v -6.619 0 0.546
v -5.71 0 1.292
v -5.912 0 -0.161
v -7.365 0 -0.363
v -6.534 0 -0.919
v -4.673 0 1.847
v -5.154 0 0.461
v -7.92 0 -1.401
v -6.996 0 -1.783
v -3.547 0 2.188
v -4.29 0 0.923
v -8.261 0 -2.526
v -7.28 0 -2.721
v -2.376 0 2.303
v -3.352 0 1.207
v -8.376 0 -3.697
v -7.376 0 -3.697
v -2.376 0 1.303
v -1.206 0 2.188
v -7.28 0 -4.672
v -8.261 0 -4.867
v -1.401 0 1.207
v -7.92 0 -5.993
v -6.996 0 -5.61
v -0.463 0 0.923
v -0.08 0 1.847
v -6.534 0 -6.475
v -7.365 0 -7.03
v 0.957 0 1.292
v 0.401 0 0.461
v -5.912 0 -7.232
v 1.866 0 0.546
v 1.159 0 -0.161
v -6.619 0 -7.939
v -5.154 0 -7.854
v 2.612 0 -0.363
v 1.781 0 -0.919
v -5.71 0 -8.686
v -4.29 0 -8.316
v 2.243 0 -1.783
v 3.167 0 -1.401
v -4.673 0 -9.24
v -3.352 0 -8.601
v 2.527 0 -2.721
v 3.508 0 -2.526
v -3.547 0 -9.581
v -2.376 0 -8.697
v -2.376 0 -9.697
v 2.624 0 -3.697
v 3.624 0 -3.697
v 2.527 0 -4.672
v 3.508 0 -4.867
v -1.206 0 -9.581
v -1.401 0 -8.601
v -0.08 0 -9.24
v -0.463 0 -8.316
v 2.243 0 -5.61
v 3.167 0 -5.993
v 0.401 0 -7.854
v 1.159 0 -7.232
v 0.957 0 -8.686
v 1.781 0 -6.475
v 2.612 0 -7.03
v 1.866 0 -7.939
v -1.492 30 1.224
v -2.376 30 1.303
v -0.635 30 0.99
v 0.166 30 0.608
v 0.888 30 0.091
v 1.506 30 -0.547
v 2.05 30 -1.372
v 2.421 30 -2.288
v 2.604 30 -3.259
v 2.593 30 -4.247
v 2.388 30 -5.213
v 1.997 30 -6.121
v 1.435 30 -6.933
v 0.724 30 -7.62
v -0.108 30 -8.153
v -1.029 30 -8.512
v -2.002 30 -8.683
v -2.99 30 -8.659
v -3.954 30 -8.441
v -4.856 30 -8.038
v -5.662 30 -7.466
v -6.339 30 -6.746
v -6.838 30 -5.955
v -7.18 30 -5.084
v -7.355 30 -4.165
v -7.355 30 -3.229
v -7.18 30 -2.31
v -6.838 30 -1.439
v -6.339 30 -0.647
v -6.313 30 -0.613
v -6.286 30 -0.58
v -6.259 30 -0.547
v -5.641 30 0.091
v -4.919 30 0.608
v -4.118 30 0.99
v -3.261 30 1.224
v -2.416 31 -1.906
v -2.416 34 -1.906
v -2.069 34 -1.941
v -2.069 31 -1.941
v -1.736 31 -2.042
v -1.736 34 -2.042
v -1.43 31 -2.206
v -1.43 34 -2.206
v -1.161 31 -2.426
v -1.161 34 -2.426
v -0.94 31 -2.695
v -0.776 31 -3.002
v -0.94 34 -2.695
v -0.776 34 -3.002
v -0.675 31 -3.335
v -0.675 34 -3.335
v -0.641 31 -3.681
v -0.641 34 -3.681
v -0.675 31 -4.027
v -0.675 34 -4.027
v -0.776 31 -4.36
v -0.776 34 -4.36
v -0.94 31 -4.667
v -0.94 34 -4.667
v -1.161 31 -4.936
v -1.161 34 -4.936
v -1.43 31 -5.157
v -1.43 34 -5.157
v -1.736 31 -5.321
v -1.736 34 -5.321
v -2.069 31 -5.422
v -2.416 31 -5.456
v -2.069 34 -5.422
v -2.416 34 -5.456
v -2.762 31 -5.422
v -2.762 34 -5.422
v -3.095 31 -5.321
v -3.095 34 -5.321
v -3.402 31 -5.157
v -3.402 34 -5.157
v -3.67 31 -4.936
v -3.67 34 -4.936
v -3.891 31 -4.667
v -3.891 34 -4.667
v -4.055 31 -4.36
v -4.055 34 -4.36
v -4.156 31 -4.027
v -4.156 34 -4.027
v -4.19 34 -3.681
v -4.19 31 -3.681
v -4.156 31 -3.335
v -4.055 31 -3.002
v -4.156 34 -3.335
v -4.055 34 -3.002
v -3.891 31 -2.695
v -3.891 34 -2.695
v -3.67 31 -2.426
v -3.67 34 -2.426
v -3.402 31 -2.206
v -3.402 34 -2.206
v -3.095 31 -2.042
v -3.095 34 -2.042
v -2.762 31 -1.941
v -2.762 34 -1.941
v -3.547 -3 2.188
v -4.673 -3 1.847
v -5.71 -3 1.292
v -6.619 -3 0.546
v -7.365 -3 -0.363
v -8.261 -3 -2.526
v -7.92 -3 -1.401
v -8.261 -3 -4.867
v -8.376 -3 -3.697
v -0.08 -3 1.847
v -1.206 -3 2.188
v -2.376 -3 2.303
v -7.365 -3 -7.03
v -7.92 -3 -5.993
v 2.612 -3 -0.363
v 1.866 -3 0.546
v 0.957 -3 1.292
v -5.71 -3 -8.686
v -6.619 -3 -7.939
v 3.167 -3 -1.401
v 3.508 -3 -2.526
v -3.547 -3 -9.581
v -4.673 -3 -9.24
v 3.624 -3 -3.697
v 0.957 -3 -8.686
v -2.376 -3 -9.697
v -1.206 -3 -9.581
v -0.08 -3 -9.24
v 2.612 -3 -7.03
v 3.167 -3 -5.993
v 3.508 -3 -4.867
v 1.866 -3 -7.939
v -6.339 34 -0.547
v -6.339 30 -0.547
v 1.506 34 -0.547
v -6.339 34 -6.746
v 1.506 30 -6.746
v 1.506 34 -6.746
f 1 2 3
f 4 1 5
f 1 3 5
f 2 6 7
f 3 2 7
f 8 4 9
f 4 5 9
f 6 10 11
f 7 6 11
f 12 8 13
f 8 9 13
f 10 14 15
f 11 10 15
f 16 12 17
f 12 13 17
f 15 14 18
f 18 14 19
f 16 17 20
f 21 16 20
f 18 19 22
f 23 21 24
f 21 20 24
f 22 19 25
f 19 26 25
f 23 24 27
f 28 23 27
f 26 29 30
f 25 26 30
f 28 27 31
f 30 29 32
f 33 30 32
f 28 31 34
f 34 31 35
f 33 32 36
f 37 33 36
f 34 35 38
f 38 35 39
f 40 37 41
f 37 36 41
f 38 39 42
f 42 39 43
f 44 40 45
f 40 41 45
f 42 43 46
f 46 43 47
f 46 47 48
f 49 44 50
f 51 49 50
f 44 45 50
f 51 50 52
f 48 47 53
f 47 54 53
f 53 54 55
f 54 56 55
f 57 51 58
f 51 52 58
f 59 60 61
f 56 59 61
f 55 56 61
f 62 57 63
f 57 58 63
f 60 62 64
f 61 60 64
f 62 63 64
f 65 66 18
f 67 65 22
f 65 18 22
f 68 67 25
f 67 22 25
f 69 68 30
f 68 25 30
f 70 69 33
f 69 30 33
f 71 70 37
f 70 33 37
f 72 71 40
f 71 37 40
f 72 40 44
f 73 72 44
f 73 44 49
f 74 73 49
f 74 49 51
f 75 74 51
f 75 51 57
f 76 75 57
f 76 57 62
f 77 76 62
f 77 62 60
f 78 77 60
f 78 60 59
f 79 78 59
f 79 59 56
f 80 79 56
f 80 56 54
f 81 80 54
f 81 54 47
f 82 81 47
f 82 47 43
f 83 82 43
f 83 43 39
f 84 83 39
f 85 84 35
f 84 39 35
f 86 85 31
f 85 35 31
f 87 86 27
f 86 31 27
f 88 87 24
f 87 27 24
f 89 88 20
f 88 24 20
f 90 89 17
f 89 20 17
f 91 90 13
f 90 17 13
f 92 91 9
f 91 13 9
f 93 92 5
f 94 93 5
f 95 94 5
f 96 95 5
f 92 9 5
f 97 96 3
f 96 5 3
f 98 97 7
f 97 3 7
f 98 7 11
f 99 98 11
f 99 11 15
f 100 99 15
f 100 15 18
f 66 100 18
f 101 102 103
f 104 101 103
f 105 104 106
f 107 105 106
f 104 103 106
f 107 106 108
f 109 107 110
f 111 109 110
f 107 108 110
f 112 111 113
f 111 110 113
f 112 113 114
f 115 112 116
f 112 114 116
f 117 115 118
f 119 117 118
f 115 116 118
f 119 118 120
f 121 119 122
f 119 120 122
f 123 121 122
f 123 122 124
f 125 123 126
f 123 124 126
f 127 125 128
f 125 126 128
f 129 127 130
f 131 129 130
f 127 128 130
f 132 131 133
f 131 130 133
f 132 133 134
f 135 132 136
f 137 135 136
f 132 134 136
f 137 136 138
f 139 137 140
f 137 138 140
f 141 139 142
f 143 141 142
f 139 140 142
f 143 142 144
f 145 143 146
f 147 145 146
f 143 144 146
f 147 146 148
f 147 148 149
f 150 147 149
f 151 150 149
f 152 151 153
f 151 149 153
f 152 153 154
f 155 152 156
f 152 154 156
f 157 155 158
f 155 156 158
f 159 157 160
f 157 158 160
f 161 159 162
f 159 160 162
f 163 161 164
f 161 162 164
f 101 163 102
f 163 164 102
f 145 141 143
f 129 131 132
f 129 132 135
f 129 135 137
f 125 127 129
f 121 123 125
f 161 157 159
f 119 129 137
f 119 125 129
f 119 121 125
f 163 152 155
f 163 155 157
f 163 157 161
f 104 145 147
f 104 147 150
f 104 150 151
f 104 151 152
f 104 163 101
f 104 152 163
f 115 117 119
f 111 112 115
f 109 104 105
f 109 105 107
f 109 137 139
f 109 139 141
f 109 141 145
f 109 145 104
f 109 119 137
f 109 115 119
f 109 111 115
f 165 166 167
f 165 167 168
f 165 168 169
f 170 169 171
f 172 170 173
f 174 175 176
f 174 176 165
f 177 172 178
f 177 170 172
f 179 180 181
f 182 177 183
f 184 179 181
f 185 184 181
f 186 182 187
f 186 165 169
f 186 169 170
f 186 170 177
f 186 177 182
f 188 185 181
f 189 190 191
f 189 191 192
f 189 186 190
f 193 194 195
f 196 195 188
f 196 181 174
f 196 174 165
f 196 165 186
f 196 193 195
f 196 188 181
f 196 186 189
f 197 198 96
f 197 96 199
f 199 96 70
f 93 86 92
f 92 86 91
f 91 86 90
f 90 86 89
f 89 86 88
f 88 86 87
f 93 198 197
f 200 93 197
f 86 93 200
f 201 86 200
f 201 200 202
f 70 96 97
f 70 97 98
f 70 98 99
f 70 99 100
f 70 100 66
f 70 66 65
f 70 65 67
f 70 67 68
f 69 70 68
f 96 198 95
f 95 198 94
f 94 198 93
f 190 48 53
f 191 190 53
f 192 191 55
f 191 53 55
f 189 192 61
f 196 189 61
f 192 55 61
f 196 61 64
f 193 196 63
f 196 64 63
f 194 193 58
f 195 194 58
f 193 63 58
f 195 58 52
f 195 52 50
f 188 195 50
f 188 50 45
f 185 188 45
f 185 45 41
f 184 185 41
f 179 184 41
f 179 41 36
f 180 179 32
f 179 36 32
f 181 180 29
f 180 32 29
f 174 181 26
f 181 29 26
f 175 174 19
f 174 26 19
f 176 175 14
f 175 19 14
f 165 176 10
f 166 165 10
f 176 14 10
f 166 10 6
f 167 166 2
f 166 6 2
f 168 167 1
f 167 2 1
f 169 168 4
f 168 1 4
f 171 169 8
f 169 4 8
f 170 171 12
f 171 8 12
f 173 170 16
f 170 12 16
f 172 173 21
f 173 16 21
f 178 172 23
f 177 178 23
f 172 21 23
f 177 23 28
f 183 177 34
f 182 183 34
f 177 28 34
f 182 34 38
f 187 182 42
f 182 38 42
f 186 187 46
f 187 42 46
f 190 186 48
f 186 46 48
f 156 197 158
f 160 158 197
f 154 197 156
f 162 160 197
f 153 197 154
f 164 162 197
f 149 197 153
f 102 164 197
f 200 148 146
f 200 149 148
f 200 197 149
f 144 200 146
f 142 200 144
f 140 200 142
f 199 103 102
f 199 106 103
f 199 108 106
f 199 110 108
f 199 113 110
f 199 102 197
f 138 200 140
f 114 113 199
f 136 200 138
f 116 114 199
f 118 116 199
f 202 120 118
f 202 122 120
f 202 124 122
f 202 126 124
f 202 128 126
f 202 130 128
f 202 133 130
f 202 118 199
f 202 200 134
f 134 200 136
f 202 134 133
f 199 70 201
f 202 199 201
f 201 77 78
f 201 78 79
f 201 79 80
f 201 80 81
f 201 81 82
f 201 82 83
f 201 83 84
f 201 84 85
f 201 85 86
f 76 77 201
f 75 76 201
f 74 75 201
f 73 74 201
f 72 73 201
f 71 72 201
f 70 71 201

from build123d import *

# Parameters (mm, degrees)
SKETCH1_R           = 5
BOSS_EXTRUDE2_DEPTH = 30
SKETCH2_W           = 7.845289229
SKETCH2_H           = 6.199593877
BOSS_EXTRUDE3_DEPTH = 4
SKETCH3_R           = 1.774695969
CUT_EXTRUDE1_DEPTH  = 3
SKETCH4_R           = 6
BOSS_EXTRUDE4_DEPTH = 3


with BuildPart() as part:
    # Sketch1 → Boss-Extrude2 (new body)
    with BuildSketch(Plane(origin=(0, 0, 0), x_dir=(1, 0, 0), z_dir=(0, 1, 0))):
        with Locations(Location((-2.376457655, 3.696711907, 0), (0, 0, 270))):
            Circle(SKETCH1_R)
    extrude(amount=BOSS_EXTRUDE2_DEPTH)

    # Sketch2 → Boss-Extrude3 (add)
    with BuildSketch(Plane(origin=(0, 30, 0), x_dir=(1, 0, 0), z_dir=(0, 1, 0))):
        with Locations((-2.416245544, 3.646362238)):
            Rectangle(SKETCH2_W, SKETCH2_H)
    extrude(amount=BOSS_EXTRUDE3_DEPTH)

    # Sketch3 → Cut-Extrude1 (cut)
    with BuildSketch(Plane(origin=(0, 34, 0), x_dir=(1, 0, 0), z_dir=(0, 1, 0))):
        with Locations(Location((-2.415547682, 3.681180673, 0), (0, 0, 270))):
            Circle(SKETCH3_R)
    extrude(amount=-CUT_EXTRUDE1_DEPTH, mode=Mode.SUBTRACT)

    # Sketch4 → Boss-Extrude4 (add)
    with BuildSketch(Plane(origin=(0, 0, 0), x_dir=(-1, 0, 0), z_dir=(0, -1, 0))):
        with Locations(Location((2.376457655, 3.696711907, 0), (0, 0, 90))):
            Circle(SKETCH4_R)
    extrude(amount=BOSS_EXTRUDE4_DEPTH)


solid = part.part
